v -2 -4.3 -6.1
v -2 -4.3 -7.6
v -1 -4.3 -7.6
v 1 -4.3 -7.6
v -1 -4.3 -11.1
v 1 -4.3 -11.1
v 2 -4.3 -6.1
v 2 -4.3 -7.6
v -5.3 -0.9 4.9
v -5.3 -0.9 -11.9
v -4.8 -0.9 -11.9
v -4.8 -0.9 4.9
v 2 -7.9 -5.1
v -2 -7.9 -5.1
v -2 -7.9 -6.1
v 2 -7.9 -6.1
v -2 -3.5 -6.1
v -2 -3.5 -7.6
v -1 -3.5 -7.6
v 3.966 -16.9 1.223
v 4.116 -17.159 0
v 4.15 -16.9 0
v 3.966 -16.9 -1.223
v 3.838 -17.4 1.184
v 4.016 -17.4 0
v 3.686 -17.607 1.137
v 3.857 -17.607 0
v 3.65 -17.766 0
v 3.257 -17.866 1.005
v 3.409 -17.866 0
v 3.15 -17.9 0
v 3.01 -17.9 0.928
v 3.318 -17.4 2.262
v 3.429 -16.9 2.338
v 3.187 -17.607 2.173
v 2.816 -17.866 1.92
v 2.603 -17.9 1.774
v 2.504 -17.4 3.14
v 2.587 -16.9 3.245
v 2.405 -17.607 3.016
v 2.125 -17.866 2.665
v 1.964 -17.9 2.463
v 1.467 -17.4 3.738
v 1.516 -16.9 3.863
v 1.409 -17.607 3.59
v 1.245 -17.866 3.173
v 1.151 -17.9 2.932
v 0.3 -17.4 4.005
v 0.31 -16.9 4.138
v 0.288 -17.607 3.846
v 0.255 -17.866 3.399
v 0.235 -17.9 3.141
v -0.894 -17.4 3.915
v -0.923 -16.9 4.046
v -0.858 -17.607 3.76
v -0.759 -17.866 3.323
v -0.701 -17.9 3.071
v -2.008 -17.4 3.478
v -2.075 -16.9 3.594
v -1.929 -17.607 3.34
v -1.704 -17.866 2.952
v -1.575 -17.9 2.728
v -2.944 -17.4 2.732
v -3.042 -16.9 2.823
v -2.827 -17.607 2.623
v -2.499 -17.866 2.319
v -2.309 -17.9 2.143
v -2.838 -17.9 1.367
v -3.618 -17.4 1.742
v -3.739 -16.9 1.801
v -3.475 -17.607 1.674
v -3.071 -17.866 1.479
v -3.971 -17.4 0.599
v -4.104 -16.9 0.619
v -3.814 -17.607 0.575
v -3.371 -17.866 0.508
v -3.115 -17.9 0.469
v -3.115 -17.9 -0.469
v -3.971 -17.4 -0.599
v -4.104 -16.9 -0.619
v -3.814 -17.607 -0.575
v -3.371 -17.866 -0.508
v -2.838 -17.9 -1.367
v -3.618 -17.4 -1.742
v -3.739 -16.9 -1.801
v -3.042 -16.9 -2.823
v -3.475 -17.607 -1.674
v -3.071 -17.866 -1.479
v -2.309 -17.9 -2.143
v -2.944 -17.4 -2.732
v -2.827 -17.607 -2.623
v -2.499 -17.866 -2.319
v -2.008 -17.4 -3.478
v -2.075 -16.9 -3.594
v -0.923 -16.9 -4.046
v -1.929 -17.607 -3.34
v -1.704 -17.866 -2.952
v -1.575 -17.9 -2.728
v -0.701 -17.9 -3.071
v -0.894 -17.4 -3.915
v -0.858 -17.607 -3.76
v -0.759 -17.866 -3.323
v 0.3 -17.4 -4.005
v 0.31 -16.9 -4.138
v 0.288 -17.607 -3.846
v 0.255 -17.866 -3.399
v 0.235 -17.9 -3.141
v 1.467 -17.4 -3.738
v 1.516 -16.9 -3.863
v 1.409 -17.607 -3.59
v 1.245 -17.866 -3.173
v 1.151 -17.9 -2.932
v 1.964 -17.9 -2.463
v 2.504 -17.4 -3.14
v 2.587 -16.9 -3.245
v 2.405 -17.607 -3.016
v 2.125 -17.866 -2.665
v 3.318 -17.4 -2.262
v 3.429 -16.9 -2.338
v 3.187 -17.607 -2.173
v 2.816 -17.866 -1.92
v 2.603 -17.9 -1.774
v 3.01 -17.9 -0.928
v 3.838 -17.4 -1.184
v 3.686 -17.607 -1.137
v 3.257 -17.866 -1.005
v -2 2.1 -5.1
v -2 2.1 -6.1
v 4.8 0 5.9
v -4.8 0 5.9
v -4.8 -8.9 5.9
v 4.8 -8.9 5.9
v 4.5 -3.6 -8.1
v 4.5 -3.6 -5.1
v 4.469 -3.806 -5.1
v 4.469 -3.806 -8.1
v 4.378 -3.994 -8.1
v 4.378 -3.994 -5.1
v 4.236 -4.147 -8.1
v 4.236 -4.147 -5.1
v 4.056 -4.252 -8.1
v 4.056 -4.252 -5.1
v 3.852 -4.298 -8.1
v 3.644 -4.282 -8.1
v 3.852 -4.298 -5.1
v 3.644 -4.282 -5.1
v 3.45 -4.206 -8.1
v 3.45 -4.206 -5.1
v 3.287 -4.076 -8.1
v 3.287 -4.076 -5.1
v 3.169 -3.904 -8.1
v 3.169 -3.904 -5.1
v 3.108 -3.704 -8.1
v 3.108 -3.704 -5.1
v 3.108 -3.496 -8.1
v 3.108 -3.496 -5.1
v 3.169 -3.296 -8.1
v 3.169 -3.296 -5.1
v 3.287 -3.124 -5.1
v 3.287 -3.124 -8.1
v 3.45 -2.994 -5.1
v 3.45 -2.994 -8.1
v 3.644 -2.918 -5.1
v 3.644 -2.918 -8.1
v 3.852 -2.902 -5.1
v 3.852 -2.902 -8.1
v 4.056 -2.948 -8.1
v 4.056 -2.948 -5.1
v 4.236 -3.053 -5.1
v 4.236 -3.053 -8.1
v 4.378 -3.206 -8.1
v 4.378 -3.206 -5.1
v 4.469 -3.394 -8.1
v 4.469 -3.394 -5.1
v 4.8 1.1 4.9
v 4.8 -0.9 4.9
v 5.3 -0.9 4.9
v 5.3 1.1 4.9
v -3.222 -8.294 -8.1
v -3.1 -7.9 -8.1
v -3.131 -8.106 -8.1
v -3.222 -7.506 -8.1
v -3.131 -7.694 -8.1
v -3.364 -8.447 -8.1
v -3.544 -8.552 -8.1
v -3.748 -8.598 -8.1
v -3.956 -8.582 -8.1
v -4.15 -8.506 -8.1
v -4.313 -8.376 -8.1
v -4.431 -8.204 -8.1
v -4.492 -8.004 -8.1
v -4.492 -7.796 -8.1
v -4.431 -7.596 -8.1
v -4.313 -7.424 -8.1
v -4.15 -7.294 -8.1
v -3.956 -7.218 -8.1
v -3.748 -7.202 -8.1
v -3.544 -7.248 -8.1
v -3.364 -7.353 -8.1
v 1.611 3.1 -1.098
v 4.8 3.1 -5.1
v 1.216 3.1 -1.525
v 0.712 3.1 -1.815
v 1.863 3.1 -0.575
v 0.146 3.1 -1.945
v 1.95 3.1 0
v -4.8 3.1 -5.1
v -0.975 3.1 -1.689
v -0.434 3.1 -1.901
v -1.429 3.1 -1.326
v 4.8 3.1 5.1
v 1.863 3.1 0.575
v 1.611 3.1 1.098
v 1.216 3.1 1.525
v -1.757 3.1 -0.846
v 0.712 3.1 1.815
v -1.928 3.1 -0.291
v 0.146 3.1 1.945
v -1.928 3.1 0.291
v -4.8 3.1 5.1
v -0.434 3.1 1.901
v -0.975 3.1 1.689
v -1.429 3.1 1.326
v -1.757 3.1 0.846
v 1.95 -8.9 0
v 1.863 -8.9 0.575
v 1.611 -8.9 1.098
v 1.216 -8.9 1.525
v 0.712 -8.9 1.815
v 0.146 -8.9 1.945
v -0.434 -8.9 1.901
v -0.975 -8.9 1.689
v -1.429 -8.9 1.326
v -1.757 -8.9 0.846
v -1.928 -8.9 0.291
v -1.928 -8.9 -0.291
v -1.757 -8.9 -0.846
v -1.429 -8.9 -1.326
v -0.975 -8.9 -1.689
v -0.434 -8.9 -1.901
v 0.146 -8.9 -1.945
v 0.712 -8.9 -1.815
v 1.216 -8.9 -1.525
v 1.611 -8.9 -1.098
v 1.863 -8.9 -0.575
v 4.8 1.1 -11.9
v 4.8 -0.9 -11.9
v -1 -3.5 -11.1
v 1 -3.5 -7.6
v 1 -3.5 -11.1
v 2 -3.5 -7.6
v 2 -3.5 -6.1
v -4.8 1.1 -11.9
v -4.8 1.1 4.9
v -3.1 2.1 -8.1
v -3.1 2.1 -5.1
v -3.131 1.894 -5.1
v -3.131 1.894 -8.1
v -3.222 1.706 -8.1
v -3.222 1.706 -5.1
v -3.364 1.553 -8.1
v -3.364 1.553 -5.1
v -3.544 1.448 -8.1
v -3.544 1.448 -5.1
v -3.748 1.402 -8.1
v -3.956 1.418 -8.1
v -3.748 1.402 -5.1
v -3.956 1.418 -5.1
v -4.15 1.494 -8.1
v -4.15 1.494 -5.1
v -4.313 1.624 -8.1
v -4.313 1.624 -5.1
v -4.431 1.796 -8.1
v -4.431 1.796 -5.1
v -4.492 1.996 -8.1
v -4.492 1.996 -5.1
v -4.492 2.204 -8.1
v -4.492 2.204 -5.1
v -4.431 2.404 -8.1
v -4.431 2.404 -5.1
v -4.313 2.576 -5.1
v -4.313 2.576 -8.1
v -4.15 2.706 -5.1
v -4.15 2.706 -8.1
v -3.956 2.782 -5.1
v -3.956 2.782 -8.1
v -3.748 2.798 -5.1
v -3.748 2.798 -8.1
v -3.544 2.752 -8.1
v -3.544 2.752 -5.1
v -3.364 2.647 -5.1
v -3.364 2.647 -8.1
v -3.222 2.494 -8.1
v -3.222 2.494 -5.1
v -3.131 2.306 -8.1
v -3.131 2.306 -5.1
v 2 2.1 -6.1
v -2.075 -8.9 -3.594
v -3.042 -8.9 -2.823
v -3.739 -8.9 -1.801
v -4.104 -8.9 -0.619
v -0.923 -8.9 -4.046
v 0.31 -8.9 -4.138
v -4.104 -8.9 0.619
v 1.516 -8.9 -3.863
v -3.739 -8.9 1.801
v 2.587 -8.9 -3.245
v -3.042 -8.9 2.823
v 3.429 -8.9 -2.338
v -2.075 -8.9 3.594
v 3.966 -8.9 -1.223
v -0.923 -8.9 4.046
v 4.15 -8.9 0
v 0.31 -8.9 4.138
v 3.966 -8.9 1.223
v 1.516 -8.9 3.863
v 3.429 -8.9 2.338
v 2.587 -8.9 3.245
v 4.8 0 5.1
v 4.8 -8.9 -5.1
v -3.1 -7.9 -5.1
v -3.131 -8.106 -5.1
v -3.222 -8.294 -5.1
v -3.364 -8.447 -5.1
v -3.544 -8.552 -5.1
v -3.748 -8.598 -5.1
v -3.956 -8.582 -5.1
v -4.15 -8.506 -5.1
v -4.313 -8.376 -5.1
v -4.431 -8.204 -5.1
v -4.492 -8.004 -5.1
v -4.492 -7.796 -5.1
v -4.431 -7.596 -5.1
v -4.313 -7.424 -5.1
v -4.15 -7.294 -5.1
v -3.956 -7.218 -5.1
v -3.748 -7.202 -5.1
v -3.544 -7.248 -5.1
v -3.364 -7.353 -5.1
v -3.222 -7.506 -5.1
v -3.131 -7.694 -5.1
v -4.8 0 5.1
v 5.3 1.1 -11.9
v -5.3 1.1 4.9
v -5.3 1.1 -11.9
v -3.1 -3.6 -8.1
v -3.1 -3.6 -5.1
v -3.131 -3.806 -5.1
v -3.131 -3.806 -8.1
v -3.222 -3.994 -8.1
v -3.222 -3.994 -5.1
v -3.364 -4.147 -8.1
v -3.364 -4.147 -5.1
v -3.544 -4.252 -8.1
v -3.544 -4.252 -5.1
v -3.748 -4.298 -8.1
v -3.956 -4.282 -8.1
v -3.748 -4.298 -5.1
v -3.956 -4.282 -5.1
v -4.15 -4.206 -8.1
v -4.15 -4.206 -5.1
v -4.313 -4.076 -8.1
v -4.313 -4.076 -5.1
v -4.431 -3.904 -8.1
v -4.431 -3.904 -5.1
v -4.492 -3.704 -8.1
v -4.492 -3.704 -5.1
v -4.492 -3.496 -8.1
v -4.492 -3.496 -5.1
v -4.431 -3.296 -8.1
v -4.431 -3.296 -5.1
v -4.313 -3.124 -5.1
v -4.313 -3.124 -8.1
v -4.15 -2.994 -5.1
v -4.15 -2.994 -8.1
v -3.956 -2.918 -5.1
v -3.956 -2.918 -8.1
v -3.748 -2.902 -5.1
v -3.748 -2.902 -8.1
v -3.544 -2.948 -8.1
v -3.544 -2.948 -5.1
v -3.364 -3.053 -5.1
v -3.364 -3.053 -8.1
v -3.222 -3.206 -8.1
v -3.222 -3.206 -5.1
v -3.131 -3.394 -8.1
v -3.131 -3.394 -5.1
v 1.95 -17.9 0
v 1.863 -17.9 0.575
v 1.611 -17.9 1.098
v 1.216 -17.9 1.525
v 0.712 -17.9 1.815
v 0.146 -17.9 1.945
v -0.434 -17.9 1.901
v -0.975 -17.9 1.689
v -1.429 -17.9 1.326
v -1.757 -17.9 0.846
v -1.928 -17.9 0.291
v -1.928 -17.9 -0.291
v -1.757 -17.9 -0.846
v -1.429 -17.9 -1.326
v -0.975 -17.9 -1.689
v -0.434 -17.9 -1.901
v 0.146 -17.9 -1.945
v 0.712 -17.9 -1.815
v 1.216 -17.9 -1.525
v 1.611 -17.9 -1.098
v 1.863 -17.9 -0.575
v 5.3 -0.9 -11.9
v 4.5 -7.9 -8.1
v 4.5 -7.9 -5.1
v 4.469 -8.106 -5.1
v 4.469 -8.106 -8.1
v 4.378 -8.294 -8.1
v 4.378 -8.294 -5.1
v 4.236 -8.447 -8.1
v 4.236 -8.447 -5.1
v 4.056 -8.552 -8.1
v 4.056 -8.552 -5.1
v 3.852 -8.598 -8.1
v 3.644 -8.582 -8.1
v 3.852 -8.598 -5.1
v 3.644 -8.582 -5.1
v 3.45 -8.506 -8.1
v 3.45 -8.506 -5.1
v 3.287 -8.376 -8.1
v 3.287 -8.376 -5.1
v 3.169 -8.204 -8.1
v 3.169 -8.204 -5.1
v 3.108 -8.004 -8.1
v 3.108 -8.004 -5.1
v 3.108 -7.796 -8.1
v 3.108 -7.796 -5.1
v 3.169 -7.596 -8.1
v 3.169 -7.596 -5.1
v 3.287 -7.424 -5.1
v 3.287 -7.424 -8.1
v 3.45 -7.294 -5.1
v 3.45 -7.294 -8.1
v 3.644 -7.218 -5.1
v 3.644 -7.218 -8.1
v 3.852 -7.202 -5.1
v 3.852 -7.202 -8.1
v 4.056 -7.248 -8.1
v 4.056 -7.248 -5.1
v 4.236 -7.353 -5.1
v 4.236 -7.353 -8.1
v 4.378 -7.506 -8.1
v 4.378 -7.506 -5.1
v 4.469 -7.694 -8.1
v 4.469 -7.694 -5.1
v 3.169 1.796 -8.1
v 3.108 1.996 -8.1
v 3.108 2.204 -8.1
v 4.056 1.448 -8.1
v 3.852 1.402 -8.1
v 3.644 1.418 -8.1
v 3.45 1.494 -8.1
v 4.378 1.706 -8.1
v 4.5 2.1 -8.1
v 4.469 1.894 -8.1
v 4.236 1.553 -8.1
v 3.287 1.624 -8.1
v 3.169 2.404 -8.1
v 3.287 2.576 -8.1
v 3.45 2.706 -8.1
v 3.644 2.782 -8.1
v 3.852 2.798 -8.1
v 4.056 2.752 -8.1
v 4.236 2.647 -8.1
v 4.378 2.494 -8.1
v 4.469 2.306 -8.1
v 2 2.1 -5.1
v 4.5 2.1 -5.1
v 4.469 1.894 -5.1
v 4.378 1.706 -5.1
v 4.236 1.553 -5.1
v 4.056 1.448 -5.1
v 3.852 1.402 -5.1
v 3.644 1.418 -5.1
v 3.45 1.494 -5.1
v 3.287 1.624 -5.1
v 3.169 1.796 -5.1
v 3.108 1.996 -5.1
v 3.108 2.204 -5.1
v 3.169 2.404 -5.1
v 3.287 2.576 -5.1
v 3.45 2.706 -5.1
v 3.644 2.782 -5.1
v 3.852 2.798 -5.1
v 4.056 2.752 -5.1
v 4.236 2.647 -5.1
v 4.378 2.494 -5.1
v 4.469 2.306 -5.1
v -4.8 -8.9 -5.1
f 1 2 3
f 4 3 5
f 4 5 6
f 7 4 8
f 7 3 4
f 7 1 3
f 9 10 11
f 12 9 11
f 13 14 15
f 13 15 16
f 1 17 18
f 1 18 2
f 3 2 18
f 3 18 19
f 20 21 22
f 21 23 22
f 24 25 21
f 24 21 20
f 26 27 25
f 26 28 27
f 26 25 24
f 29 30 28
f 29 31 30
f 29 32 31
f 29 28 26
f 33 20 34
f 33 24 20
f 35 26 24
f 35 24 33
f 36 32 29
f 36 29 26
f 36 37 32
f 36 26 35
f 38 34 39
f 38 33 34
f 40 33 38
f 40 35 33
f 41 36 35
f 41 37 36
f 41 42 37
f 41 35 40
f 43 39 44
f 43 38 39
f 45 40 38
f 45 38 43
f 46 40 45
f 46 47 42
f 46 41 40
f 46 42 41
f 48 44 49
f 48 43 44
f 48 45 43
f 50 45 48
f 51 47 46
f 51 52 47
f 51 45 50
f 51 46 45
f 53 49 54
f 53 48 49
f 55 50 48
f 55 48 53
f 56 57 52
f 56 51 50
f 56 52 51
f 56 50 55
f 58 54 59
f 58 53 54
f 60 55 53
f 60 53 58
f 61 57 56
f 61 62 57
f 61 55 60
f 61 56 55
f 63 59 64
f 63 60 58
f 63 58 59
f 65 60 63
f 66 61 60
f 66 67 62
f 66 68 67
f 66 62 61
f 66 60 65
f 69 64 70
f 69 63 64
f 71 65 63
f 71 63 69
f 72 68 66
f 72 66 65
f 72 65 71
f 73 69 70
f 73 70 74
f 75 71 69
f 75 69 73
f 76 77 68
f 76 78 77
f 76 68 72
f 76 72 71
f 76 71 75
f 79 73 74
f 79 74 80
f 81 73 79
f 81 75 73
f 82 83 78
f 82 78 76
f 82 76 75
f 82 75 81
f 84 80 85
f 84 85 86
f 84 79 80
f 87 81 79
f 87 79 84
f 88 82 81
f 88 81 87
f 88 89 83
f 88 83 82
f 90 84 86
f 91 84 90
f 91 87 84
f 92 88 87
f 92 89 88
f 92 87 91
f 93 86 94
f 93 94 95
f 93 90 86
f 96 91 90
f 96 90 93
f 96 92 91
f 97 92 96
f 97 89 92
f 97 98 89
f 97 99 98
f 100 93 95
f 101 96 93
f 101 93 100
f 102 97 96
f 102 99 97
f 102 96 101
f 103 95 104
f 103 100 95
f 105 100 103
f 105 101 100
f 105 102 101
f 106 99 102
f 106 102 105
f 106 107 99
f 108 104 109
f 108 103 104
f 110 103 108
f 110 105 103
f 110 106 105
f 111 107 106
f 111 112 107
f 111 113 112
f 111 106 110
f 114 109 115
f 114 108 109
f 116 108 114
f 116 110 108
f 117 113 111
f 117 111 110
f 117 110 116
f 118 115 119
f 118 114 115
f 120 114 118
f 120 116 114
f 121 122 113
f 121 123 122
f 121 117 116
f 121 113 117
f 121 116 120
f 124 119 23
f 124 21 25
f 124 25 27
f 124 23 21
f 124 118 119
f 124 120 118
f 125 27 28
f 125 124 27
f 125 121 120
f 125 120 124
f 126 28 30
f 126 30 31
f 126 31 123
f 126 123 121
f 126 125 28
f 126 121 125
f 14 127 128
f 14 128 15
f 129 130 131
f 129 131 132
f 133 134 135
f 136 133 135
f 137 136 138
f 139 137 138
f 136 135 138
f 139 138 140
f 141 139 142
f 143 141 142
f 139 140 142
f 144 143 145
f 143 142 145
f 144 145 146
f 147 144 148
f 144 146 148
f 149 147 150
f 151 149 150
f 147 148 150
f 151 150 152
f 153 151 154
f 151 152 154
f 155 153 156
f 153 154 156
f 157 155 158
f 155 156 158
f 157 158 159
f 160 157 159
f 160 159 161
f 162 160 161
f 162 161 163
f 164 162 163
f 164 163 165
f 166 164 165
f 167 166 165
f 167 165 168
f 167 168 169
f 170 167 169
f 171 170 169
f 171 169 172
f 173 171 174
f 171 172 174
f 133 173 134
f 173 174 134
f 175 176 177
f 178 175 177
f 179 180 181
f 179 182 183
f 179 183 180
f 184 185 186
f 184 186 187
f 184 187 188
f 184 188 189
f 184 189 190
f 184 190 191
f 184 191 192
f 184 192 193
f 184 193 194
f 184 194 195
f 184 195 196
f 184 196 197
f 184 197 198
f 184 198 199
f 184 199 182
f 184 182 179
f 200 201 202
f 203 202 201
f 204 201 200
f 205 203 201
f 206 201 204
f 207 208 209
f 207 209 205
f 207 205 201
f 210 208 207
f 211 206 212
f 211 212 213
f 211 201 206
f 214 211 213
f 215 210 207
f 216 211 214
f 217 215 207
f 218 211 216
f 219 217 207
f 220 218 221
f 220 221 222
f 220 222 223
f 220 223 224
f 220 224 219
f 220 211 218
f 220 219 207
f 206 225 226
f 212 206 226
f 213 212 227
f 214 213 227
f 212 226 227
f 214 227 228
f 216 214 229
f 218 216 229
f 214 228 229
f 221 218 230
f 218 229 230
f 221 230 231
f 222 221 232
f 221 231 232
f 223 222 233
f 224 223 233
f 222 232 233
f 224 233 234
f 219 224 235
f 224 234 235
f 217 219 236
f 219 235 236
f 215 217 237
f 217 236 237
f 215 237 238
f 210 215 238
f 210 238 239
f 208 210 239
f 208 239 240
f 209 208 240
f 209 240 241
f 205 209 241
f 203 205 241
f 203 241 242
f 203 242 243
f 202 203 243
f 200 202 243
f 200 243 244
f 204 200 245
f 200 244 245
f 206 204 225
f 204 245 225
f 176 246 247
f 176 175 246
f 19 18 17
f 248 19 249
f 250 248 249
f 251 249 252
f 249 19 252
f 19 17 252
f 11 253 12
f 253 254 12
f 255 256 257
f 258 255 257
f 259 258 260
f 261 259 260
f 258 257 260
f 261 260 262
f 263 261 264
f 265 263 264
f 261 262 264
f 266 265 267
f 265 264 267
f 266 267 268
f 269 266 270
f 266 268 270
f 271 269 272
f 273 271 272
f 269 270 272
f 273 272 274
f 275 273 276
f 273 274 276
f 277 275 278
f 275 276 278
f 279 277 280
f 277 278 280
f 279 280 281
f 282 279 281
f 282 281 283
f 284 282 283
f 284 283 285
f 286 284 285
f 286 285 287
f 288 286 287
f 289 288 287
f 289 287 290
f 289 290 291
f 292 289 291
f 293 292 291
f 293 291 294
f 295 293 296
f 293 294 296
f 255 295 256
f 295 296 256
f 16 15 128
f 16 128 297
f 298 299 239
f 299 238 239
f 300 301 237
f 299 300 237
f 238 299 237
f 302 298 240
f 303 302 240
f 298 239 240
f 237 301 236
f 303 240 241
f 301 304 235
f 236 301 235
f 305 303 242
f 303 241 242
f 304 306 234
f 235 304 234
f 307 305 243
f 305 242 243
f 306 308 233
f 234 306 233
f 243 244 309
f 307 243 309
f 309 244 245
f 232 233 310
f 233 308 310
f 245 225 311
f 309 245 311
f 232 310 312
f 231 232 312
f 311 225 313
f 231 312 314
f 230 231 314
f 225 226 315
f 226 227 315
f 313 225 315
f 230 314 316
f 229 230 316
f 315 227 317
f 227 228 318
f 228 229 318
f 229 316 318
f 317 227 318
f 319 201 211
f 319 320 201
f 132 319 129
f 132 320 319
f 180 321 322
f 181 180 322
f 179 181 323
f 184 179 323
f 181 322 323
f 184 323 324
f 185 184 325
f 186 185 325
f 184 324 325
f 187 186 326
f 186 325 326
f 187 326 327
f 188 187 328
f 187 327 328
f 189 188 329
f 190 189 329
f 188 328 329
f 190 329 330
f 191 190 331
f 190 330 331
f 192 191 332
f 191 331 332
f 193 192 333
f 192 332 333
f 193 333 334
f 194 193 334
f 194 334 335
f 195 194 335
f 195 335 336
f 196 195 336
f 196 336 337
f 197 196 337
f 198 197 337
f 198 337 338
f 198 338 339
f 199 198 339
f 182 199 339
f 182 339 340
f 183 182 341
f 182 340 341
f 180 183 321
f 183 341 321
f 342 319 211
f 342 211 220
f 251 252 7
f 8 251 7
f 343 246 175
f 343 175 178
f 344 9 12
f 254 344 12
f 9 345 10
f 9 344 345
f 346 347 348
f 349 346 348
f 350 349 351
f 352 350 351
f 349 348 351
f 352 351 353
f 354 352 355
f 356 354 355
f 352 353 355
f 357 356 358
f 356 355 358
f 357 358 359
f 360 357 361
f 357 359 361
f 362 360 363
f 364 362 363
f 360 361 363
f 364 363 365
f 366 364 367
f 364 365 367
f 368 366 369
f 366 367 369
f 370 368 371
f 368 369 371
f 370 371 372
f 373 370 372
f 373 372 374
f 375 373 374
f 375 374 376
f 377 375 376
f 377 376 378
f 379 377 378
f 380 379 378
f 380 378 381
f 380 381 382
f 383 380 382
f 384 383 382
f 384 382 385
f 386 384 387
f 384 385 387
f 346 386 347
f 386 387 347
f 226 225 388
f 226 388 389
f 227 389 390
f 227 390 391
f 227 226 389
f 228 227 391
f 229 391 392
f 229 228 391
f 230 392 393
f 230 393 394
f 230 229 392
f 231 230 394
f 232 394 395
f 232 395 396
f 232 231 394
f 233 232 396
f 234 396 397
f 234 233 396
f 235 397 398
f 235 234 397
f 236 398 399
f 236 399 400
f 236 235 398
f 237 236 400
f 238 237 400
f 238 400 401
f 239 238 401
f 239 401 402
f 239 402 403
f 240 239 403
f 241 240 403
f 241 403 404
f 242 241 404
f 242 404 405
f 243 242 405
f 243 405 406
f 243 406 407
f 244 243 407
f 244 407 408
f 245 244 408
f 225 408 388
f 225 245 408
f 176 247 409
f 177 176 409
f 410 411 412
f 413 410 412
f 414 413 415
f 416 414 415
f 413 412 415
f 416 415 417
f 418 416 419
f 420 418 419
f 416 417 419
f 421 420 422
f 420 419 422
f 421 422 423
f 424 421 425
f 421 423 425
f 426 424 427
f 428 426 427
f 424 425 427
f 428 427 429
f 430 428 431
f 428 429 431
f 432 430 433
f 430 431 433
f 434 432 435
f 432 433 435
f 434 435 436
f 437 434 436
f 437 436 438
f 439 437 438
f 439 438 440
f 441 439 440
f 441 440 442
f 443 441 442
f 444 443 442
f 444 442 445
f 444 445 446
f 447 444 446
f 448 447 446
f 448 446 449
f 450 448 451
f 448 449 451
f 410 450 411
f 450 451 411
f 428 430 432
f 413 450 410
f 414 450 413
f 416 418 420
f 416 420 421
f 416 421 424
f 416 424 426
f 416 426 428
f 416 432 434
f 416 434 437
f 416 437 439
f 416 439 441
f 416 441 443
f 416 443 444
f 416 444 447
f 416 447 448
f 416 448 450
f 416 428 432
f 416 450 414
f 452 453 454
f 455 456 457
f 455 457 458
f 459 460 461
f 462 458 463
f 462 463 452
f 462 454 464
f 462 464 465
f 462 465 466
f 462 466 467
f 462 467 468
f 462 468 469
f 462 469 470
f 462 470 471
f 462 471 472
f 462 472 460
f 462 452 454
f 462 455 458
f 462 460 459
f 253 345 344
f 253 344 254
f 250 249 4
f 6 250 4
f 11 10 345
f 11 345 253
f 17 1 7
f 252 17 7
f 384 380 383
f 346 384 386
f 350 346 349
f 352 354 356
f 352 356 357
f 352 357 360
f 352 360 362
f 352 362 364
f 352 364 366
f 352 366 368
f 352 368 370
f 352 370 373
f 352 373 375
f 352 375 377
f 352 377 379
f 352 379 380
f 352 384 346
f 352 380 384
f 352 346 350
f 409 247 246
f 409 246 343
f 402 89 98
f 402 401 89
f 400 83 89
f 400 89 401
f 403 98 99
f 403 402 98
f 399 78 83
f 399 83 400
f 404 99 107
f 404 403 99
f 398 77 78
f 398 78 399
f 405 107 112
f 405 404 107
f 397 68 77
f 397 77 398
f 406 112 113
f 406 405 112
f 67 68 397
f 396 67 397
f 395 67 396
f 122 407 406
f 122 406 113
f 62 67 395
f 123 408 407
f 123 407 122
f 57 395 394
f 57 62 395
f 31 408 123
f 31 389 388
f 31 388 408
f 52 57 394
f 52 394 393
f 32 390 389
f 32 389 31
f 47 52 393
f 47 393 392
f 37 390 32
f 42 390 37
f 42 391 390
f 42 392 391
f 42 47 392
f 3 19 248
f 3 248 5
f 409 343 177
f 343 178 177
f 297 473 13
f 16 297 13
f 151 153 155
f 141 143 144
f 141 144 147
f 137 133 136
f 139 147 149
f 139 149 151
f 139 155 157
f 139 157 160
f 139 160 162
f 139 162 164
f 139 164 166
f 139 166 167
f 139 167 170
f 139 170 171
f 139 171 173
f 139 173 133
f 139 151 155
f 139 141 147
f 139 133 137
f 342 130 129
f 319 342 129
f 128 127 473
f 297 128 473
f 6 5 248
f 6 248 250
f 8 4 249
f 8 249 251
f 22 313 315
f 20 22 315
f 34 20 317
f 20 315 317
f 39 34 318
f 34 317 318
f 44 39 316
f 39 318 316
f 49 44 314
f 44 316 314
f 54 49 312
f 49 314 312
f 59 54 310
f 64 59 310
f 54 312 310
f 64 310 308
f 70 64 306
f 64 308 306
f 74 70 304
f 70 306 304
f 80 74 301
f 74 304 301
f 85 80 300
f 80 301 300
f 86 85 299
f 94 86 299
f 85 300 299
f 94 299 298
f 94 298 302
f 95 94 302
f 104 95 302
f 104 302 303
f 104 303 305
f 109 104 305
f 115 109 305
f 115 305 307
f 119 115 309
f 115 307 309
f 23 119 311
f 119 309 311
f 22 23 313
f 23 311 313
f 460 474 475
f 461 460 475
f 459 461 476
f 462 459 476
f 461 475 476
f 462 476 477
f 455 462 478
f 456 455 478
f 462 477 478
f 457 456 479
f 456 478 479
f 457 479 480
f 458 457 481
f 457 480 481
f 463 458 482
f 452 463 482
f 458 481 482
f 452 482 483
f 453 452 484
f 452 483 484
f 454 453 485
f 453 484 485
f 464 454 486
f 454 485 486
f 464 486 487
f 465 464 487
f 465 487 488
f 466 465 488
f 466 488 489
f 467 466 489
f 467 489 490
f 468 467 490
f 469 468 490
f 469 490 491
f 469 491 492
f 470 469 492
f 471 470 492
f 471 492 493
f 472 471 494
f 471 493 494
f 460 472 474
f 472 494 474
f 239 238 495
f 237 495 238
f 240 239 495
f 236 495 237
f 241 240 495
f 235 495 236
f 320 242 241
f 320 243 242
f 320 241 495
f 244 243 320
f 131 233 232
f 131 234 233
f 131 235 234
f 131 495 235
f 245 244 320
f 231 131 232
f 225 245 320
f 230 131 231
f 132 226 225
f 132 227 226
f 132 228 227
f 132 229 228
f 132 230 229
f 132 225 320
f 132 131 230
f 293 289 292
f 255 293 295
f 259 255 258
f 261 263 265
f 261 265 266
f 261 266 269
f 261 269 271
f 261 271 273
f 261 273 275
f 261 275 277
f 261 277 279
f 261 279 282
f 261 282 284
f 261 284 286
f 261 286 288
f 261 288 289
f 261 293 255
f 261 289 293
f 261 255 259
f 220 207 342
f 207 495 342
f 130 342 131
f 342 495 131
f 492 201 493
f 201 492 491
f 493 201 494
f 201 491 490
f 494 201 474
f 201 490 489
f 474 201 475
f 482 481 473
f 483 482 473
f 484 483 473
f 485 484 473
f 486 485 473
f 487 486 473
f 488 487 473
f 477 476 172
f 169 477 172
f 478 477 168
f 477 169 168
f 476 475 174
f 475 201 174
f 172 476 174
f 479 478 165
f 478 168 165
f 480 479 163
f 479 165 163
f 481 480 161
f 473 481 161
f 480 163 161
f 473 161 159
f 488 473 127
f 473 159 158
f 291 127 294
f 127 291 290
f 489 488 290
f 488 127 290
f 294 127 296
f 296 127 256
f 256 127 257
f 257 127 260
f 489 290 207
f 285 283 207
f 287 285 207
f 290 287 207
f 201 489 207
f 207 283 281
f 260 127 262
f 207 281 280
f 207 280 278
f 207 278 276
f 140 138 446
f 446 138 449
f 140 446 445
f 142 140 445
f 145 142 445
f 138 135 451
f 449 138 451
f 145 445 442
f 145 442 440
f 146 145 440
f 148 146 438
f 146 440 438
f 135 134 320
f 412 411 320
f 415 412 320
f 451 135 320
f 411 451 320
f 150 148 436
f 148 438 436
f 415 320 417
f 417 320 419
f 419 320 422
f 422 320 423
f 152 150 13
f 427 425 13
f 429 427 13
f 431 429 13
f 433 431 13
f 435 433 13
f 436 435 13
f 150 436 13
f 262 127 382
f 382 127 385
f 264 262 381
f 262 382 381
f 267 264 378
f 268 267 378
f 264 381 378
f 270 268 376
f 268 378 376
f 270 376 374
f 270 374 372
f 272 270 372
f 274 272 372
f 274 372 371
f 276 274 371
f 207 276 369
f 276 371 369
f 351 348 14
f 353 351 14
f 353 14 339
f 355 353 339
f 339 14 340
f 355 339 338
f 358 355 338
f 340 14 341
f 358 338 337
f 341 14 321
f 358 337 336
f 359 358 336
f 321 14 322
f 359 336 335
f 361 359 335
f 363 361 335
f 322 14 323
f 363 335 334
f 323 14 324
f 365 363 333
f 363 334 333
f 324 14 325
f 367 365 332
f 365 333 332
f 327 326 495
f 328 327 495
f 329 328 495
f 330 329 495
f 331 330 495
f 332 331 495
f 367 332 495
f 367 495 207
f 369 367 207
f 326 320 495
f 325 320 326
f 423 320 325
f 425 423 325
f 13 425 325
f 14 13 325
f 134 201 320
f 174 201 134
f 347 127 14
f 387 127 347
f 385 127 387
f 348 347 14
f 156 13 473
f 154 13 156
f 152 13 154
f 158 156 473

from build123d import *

# Parameters (mm, degrees)
F0_W      = 9.6
F0_H      = 11
F1_DEPTH  = 8.9
F2_W      = 9.6
F2_H      = 10.2
F3_DEPTH  = 3.1
F4_R      = 0.7
F5_DEPTH  = 3
F4_W      = 4
F4_H      = 10
F6_DEPTH  = 1
F4_W_2    = 0.5
F4_H_2    = 2
F7_DEPTH  = 10
F8_DEPTH  = 6.8
F9_W      = 4
F9_H      = 0.8
F10_DEPTH = 1.5
F11_DEPTH = 6.8
F12_R     = 4.15
F12_R_2   = 1.95
F13_DEPTH = 9
F14_R     = 1
F15_DEPTH = 12
F16_W     = 2
F16_H     = 0.8
F17_DEPTH = 3.5


with BuildPart() as f1:
    # F0 (on Front) → F1 (new body)
    with BuildSketch(Plane.XZ):
        with Locations((0, 0.4)):
            Rectangle(F0_W, F0_H)
    extrude(amount=F1_DEPTH)

    # F2 (on face) → F3 (join)
    with BuildSketch(Plane(origin=(0, 0, 0), x_dir=(-1, 0, 0), z_dir=(0, 1, 0))):
        Rectangle(F2_W, F2_H)
    extrude(amount=F3_DEPTH)

    # F4 (on face) → F5 (join)
    with BuildSketch(Plane(origin=(0, 0, -5.1), x_dir=(1, 0, 0), z_dir=(0, 0, -1))):
        with Locations((-3.8, 7.9)):
            Circle(F4_R)
        with Locations((-3.8, 3.6)):
            Circle(F4_R)
        with Locations((-3.8, -2.1)):
            Circle(F4_R)
        with Locations((3.8, -2.1)):
            Circle(F4_R)
        with Locations((3.8, 3.6)):
            Circle(F4_R)
        with Locations((3.8, 7.9)):
            Circle(F4_R)
    extrude(amount=F5_DEPTH)

    # F4 (on face) → F6 (join)
    with BuildSketch(Plane(origin=(0, 0, -5.1), x_dir=(1, 0, 0), z_dir=(0, 0, -1))):
        with Locations((0, 2.9)):
            Rectangle(F4_W, F4_H)
    extrude(amount=F6_DEPTH)

    # F12 (on face) → F15 (cut)
    with BuildSketch(Plane.XZ.offset(8.9)):
        Circle(F12_R_2)
    extrude(amount=-F15_DEPTH, mode=Mode.SUBTRACT)


with BuildPart() as f7:
    # F4 (on face) → F7 (new body)
    with BuildSketch(Plane(origin=(0, 0, -5.1), x_dir=(1, 0, 0), z_dir=(0, 0, -1))):
        with Locations((5.05, -0.1)):
            Rectangle(F4_W_2, F4_H_2)
    extrude(amount=-F7_DEPTH)

    # F4 (on face) → F11 (join)
    with BuildSketch(Plane(origin=(0, 0, -5.1), x_dir=(1, 0, 0), z_dir=(0, 0, -1))):
        with Locations((5.05, -0.1)):
            Rectangle(F4_W_2, F4_H_2)
    extrude(amount=F11_DEPTH)


with BuildPart() as f7b:
    # F4 (on face) → F7, piece 2 (new body)
    with BuildSketch(Plane(origin=(0, 0, -5.1), x_dir=(1, 0, 0), z_dir=(0, 0, -1))):
        with Locations((-5.05, -0.1)):
            Rectangle(F4_W_2, F4_H_2)
    extrude(amount=-F7_DEPTH)

    # F4 (on face) → F8 (join)
    with BuildSketch(Plane(origin=(0, 0, -5.1), x_dir=(1, 0, 0), z_dir=(0, 0, -1))):
        with Locations((-5.05, -0.1)):
            Rectangle(F4_W_2, F4_H_2)
    extrude(amount=F8_DEPTH)


with BuildPart() as f10:
    # F9 (on face) → F10 (new body)
    with BuildSketch(Plane(origin=(0, 0, -6.1), x_dir=(1, 0, 0), z_dir=(0, 0, -1))):
        with Locations((0, 3.9)):
            Rectangle(F9_W, F9_H)
    extrude(amount=F10_DEPTH)

    # F16 (on face) → F17 (join)
    with BuildSketch(Plane(origin=(0, 0, -7.6), x_dir=(1, 0, 0), z_dir=(0, 0, -1))):
        with Locations((0, 3.9)):
            Rectangle(F16_W, F16_H)
    extrude(amount=F17_DEPTH)


with BuildPart() as f13:
    # F12 (on face) → F13 (new body)
    with BuildSketch(Plane.XZ.offset(8.9)):
        Circle(F12_R)
        Circle(F12_R_2, mode=Mode.SUBTRACT)
    extrude(amount=F13_DEPTH)

    # F14
    f14_edges = [f13.edges().sort_by_distance(p)[0] for p in [
        (-4.15, -17.9, 0),
    ]]
    fillet(f14_edges, radius=F14_R)


solid = Compound([f1.part, f7.part, f7b.part, f10.part, f13.part])
